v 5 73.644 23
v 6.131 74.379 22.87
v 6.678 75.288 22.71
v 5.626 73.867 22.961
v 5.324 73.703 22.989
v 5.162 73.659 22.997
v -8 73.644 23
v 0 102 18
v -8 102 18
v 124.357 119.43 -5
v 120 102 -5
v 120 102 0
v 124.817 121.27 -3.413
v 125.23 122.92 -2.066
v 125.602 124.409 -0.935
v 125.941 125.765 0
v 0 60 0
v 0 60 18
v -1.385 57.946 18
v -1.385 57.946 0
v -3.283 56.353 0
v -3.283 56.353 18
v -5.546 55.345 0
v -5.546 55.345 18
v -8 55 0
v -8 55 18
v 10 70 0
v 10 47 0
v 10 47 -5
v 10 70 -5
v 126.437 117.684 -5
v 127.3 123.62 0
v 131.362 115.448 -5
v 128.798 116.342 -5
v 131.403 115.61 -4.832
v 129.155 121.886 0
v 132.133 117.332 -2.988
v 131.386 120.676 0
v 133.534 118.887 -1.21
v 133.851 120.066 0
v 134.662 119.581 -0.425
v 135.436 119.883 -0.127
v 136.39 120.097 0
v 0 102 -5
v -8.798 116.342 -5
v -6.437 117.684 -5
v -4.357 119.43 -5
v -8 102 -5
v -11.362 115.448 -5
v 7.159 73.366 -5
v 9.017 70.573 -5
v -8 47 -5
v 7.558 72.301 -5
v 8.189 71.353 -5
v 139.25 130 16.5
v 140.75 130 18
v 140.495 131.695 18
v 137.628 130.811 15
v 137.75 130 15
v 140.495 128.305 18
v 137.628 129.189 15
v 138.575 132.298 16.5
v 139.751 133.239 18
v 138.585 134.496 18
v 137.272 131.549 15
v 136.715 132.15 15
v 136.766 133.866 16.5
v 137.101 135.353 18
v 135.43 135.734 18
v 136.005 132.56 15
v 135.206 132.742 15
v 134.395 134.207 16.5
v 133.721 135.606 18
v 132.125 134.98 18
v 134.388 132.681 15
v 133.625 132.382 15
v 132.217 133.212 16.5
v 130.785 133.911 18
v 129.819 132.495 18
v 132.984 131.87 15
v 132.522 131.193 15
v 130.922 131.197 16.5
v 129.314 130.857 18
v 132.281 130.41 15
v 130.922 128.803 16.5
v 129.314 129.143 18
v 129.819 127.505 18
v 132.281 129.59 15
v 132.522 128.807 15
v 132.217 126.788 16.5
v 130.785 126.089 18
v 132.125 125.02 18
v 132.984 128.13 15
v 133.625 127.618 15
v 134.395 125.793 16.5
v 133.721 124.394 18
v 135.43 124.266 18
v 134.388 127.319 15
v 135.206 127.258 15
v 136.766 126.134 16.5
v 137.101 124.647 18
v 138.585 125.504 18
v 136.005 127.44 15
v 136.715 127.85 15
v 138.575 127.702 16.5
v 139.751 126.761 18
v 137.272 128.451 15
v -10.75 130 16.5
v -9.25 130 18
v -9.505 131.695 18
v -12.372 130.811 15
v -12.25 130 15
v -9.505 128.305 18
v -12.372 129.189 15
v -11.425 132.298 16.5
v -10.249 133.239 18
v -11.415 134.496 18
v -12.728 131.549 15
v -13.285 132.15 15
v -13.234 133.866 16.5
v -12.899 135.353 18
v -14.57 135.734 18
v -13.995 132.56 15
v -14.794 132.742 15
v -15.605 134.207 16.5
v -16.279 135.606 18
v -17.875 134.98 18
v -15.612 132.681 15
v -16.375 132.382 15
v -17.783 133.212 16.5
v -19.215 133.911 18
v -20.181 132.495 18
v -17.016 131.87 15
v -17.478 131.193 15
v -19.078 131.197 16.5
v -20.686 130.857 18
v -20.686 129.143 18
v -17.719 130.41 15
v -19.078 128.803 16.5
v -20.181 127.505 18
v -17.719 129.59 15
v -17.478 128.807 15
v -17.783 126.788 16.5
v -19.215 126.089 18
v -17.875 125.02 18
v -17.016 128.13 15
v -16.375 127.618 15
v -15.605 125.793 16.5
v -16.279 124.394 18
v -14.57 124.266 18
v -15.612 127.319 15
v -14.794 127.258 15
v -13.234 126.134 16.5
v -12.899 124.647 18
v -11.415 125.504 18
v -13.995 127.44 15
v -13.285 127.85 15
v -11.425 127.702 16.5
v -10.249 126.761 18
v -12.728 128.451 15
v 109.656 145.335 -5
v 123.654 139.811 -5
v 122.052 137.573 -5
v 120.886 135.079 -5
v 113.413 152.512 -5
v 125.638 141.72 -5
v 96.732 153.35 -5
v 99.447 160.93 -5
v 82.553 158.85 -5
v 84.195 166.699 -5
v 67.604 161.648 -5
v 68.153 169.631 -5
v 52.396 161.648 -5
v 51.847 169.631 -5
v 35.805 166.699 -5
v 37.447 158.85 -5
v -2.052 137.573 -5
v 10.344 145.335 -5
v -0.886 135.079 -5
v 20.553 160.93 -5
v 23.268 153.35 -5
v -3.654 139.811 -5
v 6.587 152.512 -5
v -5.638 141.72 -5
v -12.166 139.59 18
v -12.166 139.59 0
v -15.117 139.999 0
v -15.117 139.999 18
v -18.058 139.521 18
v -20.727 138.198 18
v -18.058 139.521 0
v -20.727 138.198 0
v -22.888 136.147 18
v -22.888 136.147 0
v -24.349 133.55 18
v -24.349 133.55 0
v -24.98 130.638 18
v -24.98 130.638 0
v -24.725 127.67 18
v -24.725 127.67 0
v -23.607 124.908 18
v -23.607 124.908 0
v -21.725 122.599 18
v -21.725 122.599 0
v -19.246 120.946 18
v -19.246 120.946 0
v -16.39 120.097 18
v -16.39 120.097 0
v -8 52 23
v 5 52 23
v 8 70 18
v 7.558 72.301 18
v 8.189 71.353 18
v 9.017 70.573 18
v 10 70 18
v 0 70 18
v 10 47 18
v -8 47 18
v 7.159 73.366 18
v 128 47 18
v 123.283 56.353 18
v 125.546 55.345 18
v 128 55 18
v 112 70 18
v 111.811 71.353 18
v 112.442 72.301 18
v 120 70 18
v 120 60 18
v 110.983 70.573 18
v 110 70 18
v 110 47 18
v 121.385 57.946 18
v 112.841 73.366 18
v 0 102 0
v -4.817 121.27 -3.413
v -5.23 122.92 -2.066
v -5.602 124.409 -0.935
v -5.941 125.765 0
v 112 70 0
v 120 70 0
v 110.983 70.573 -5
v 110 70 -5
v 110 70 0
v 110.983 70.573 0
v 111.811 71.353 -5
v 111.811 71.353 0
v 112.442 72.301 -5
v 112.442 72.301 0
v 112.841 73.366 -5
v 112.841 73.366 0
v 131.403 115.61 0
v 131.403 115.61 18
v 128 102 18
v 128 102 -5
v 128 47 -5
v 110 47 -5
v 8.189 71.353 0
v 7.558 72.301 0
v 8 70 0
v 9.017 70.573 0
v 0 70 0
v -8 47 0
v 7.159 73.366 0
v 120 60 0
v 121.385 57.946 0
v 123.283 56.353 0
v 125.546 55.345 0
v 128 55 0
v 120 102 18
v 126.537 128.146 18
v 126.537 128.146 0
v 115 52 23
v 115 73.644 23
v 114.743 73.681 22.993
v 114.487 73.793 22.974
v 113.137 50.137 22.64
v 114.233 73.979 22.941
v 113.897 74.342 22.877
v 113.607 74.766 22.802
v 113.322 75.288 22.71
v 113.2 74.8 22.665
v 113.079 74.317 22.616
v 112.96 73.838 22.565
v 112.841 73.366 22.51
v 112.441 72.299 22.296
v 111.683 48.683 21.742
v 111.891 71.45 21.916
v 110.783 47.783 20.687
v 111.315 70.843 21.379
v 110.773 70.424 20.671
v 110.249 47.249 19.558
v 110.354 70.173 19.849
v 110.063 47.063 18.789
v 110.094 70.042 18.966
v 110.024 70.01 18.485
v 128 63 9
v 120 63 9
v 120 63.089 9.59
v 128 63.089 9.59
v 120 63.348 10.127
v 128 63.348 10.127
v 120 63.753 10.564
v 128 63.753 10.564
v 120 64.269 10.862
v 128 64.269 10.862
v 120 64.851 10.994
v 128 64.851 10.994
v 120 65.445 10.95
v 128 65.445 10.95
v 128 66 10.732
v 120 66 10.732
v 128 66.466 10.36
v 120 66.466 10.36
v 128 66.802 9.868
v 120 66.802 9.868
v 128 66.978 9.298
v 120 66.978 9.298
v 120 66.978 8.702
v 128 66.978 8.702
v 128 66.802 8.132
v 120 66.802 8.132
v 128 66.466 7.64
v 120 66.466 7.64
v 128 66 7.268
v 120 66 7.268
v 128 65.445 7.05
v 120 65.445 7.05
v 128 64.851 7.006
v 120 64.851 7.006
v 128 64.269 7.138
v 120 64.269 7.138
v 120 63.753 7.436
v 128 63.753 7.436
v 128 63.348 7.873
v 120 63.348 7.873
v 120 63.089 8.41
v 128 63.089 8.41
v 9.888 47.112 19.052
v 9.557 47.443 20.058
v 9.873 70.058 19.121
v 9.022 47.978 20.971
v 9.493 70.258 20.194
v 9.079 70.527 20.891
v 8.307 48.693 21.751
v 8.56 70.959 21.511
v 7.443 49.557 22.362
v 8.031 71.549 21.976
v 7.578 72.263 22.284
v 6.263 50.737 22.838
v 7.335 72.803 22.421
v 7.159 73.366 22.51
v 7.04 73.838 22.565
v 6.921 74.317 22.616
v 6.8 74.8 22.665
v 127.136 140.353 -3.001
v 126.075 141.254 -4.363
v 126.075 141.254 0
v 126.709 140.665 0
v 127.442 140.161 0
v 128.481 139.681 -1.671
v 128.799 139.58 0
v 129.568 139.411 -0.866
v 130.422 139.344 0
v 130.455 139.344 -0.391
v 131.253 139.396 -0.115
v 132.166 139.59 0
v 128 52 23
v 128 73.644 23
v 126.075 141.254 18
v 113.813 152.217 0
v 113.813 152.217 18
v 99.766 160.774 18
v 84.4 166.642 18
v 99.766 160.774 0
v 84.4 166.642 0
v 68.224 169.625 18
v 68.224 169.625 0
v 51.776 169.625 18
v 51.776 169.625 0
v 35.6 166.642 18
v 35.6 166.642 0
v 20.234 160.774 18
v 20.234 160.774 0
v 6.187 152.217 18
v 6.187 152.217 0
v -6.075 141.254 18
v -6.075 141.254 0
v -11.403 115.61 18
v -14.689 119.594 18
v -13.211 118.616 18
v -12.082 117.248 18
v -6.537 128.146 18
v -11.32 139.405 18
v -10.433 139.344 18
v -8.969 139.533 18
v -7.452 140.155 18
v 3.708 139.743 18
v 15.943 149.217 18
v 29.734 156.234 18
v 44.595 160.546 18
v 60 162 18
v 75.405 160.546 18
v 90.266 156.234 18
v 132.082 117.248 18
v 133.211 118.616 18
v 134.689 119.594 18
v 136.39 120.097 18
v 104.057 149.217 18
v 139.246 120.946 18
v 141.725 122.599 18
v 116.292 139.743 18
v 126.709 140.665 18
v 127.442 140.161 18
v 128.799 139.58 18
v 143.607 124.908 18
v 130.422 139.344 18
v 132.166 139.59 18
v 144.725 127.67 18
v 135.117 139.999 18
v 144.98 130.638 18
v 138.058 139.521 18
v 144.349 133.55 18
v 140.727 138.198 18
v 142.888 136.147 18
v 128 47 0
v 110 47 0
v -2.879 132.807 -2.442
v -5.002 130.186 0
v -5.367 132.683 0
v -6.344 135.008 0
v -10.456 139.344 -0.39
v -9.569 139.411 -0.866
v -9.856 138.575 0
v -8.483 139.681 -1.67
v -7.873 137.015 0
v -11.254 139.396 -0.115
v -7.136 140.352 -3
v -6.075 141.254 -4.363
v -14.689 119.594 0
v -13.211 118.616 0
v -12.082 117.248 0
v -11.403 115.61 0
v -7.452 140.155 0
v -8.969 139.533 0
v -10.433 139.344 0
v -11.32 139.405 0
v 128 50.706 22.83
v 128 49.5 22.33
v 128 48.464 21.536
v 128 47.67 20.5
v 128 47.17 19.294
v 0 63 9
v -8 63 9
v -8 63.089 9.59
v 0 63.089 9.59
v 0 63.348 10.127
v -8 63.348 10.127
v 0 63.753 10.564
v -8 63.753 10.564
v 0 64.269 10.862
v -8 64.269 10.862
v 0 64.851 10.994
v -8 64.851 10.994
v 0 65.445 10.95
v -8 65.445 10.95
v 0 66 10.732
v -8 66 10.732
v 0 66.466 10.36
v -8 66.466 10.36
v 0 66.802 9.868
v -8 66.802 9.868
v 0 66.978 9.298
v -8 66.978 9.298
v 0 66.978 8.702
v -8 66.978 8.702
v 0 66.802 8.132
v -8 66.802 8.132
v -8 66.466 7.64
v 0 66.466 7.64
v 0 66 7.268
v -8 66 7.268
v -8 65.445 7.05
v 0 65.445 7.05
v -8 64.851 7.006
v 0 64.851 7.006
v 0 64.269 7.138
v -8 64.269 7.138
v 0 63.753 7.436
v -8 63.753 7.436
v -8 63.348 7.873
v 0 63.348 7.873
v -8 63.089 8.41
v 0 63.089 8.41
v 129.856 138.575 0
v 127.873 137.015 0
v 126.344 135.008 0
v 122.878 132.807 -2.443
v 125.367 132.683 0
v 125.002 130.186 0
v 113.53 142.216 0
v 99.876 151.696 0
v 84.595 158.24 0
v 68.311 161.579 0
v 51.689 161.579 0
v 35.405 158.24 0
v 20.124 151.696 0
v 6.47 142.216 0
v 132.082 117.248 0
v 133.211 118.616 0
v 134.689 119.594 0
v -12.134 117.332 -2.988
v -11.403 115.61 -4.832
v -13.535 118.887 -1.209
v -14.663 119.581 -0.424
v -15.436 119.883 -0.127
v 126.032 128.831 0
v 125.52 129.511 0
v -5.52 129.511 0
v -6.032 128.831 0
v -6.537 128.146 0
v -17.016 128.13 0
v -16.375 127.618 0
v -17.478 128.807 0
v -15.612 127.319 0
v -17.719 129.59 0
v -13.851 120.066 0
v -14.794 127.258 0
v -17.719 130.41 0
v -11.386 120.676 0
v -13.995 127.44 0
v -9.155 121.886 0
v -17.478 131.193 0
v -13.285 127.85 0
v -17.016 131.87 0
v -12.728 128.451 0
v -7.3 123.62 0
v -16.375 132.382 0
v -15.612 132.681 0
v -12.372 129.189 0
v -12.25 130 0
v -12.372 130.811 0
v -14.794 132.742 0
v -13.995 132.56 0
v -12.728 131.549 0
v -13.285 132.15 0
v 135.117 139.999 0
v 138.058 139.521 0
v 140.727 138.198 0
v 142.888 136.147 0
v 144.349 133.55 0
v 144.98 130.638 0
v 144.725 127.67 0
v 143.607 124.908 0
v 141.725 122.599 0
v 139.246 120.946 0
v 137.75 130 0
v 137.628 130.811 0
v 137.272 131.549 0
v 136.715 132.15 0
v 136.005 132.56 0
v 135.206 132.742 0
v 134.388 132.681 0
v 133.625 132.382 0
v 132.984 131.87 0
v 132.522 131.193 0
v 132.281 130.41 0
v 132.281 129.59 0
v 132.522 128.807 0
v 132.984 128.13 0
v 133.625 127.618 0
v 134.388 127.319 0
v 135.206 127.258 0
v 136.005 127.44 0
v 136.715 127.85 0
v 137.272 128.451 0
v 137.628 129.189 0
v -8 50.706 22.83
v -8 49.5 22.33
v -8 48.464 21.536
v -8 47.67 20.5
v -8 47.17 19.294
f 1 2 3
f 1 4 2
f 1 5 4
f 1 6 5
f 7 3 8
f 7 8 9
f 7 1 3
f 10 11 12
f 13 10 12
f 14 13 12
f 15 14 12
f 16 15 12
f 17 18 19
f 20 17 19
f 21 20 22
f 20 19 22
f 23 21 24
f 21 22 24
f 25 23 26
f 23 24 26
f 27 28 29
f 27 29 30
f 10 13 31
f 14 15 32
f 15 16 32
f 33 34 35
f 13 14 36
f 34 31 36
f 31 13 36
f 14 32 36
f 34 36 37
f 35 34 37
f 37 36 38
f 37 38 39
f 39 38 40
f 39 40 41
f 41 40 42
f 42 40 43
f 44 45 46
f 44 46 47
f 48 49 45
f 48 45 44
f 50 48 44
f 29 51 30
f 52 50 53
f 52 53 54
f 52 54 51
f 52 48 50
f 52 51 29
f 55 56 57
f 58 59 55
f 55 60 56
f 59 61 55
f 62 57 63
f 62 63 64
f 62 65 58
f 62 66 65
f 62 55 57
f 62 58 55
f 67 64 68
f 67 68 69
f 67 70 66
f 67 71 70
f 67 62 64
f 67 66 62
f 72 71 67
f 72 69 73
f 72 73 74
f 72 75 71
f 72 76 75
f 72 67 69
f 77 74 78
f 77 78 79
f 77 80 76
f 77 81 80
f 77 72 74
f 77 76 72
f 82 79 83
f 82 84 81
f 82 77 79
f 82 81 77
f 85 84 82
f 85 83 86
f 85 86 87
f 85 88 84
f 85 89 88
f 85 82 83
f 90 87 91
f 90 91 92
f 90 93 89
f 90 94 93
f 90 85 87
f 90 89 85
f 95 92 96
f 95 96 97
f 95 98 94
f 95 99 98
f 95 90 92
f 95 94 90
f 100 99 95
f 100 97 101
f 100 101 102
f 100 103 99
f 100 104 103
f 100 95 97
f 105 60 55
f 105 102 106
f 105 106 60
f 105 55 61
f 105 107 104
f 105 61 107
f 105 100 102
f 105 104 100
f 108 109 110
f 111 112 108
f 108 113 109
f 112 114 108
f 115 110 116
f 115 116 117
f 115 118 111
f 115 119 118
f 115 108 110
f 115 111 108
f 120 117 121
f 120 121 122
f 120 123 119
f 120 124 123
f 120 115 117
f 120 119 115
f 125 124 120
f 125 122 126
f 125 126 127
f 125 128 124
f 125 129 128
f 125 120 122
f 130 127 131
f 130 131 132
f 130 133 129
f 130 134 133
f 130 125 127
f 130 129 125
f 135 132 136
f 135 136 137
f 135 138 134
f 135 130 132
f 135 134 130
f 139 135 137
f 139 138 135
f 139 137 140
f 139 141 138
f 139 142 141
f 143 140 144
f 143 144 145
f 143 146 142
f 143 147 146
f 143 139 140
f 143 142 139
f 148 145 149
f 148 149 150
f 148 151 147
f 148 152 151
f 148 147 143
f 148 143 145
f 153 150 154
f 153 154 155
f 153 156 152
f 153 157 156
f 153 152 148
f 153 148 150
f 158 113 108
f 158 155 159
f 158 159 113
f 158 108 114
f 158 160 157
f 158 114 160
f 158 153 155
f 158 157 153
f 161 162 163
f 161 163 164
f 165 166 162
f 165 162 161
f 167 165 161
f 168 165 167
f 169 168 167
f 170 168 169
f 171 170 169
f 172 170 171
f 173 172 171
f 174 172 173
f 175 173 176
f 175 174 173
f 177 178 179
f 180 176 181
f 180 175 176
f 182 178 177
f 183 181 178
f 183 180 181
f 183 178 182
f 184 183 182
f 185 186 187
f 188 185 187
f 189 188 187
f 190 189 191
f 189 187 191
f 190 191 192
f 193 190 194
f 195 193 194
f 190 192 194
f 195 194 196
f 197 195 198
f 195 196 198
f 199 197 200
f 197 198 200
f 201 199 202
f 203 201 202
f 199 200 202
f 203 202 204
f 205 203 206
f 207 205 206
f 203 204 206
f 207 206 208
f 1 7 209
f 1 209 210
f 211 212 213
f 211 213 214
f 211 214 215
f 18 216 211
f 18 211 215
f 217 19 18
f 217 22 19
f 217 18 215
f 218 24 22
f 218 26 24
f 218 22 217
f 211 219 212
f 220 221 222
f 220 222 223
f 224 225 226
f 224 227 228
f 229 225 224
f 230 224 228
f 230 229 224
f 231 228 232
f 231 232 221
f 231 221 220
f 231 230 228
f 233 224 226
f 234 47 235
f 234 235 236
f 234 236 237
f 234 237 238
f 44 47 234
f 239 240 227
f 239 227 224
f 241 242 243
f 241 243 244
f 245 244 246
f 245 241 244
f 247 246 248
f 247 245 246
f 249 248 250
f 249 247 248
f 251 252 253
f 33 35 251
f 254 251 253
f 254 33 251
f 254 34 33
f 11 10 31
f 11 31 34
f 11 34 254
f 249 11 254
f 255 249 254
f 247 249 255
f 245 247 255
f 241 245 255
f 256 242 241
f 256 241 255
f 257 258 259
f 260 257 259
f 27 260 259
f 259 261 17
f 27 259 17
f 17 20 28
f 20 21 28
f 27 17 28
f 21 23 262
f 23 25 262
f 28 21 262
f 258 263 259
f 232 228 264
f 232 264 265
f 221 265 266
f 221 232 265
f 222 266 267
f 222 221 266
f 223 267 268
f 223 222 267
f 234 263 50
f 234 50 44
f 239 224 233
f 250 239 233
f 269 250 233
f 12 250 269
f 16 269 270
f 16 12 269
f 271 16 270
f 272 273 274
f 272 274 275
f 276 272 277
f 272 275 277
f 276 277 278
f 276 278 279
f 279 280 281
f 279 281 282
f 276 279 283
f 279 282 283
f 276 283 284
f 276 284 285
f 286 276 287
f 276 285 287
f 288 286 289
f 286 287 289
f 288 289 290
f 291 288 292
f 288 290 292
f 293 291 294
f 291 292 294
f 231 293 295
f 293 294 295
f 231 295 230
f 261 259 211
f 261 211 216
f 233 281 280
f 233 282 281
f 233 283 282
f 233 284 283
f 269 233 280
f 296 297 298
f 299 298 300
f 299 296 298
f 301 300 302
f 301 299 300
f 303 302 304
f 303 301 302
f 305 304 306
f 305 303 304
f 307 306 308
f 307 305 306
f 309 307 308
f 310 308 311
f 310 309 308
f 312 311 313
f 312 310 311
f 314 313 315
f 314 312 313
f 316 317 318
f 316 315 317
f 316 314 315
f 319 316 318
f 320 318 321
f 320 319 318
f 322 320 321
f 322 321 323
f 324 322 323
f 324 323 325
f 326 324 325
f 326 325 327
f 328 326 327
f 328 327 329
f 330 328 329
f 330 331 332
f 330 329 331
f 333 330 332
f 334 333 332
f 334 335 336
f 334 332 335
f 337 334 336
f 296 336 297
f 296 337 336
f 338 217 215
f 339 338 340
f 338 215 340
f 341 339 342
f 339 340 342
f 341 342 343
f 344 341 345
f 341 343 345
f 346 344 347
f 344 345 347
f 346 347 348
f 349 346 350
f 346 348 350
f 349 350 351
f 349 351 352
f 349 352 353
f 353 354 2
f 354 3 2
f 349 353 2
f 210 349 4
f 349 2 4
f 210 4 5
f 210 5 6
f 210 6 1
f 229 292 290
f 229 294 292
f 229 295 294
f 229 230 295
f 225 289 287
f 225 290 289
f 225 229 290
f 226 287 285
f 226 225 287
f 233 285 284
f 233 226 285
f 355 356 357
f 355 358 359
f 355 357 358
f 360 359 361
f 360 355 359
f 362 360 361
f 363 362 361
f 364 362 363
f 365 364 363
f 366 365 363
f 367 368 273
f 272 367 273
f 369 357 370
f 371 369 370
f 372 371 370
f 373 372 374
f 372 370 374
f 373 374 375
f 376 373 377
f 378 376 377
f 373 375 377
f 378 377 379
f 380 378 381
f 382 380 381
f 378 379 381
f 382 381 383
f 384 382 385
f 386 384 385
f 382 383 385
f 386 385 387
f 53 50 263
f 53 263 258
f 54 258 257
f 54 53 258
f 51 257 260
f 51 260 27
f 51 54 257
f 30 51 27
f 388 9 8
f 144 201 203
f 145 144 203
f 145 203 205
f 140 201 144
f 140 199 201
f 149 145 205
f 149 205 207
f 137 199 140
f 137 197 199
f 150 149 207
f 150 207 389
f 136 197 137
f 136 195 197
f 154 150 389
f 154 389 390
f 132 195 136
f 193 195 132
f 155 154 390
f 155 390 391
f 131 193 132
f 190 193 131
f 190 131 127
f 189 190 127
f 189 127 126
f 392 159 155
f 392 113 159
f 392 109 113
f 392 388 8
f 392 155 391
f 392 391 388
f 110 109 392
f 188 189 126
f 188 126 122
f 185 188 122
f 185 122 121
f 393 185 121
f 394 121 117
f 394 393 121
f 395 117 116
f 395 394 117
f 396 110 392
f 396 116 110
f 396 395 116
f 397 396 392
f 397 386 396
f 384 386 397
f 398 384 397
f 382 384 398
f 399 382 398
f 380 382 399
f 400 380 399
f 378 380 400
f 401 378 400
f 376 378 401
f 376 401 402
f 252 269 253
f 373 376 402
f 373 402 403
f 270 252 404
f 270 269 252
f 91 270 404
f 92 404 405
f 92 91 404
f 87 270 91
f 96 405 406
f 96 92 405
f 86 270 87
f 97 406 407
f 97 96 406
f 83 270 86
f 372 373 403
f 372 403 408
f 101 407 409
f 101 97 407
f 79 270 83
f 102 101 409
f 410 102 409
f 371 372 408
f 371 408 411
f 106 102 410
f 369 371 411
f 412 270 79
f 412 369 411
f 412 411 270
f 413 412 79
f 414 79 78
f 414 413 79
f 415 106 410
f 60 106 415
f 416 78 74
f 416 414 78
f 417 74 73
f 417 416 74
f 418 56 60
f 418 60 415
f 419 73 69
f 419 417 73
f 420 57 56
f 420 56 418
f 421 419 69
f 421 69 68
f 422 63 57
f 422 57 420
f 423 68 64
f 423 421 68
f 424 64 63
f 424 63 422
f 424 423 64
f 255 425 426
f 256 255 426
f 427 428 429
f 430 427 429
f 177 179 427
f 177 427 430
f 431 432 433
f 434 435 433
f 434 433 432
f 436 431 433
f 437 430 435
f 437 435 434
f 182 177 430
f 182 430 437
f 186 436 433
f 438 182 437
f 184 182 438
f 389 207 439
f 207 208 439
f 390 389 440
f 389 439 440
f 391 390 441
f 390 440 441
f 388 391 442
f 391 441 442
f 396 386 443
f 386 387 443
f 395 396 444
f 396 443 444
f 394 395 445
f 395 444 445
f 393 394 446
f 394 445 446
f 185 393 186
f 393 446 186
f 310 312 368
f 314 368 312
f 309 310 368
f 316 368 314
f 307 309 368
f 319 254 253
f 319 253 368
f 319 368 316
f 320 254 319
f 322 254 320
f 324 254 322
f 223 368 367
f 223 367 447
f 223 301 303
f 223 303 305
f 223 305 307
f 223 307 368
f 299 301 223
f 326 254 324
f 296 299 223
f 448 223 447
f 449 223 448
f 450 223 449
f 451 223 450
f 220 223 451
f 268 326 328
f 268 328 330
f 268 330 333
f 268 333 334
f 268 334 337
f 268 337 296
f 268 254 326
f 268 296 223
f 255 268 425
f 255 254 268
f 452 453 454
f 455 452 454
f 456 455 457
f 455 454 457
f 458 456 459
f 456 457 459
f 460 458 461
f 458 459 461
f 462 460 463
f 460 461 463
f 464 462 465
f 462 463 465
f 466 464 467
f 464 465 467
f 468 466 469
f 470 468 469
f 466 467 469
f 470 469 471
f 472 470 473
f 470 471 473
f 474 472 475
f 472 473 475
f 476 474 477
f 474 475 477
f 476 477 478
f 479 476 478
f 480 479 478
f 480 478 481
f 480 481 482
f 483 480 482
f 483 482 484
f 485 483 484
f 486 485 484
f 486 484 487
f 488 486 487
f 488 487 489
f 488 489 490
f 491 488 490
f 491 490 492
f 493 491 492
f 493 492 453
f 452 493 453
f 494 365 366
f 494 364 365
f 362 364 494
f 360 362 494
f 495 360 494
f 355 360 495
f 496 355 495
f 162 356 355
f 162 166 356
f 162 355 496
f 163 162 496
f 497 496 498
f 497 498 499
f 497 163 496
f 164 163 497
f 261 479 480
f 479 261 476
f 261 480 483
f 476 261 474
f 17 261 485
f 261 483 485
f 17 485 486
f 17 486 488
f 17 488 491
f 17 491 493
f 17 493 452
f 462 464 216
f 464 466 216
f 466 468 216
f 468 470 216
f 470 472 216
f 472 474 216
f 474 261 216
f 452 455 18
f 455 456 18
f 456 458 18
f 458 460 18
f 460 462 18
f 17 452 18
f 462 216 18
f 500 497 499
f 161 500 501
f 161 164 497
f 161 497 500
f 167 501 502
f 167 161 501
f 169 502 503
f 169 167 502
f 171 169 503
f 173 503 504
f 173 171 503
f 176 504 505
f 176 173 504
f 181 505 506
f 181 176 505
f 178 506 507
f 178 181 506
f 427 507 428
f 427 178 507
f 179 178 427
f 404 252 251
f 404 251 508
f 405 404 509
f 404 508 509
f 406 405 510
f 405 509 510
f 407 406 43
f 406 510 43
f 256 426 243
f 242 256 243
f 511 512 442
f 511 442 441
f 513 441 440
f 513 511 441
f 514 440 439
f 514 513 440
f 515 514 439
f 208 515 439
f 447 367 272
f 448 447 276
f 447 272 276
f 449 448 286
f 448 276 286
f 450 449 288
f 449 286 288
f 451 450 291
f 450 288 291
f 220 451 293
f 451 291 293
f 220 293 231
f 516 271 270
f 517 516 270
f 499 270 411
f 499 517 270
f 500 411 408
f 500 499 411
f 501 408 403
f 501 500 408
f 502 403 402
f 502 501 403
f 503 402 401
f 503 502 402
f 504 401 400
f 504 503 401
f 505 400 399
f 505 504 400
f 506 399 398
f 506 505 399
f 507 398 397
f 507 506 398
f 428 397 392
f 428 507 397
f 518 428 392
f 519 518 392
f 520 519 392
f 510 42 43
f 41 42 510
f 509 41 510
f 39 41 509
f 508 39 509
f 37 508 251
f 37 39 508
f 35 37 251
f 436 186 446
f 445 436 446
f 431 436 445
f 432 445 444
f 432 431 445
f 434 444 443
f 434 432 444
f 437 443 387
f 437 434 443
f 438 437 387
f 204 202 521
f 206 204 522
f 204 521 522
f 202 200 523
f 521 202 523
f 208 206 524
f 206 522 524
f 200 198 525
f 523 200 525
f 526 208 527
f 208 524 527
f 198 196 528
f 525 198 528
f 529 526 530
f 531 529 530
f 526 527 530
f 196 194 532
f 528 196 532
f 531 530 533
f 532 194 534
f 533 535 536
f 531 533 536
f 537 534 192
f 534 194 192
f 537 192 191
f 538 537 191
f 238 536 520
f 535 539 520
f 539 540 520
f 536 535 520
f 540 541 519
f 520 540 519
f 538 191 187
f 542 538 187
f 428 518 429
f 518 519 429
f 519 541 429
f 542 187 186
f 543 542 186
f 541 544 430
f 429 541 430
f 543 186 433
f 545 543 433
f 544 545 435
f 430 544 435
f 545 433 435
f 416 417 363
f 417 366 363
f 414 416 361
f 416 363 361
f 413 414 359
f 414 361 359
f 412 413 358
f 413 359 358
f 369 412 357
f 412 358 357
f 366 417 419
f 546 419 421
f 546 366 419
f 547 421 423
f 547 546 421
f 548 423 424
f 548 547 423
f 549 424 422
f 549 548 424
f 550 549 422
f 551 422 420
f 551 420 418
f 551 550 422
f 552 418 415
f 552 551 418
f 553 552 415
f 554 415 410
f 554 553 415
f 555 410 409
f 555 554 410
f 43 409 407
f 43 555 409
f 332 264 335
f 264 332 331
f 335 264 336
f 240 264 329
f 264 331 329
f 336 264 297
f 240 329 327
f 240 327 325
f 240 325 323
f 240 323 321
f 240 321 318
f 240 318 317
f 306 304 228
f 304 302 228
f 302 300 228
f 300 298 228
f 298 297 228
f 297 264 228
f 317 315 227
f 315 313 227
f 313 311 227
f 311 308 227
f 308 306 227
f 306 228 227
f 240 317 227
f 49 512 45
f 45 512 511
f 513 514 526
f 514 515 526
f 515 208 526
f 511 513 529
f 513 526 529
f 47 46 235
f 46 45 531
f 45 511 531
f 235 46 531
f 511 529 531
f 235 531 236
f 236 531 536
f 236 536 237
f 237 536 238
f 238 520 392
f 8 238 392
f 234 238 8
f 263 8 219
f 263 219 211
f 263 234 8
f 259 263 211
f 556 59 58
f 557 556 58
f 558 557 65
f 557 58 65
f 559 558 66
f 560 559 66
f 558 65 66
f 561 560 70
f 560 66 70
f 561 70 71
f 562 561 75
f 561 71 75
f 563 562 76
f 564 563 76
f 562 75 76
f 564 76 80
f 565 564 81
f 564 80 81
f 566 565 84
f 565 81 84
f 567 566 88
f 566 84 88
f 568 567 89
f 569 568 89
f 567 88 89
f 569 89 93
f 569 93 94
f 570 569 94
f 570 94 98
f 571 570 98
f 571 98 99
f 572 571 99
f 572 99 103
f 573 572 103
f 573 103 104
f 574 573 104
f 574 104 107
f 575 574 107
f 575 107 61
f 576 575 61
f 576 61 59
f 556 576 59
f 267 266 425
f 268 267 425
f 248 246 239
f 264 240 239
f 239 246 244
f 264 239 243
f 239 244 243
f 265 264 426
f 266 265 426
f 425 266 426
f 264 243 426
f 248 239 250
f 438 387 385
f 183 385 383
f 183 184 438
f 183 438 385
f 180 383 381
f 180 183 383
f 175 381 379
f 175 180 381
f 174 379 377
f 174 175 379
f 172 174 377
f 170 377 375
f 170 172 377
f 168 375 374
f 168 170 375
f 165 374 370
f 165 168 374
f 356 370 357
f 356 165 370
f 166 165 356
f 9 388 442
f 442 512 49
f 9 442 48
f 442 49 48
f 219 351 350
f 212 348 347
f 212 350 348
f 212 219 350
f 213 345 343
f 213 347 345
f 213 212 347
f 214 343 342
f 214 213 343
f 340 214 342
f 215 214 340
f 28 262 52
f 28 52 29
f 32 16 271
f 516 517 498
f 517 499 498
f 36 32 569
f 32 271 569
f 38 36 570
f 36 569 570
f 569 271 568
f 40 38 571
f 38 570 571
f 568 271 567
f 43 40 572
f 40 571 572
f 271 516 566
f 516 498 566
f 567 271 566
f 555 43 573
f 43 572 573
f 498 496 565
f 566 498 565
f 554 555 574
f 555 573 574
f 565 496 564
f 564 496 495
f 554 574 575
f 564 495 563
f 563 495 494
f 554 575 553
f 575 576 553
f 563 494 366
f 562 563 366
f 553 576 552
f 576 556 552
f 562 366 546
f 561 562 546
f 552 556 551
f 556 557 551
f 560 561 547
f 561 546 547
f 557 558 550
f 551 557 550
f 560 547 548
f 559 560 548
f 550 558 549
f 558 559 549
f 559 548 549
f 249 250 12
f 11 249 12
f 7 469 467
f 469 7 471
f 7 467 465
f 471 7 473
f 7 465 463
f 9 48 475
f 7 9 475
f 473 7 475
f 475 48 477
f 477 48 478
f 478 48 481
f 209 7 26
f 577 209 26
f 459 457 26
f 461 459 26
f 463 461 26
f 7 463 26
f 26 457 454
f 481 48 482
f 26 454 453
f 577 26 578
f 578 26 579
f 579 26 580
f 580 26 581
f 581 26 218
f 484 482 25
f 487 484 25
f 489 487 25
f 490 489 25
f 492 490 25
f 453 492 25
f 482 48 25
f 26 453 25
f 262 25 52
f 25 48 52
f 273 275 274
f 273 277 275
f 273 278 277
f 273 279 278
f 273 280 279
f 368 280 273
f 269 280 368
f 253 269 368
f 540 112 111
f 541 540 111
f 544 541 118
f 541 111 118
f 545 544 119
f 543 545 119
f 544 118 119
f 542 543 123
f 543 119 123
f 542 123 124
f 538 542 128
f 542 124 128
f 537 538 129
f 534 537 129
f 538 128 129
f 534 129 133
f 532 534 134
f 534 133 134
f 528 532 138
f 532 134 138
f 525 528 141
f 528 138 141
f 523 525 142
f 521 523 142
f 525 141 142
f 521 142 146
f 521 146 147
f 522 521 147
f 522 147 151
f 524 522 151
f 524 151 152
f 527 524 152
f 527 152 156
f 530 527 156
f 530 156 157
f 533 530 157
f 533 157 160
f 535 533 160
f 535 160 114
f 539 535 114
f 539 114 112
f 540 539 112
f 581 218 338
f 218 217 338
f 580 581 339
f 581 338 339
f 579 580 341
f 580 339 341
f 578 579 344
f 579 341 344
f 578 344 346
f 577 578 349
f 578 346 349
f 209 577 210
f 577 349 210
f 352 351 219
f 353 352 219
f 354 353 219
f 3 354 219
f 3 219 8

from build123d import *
from OCP.BRepFilletAPI import BRepFilletAPI_MakeChamfer

# Parameters (mm, degrees)
ESQUISSE1_W             = 100
ESQUISSE1_H             = 10
BOSS_EXTRU_1_DEPTH      = 8
ESQUISSE2_W             = 100
ESQUISSE2_H             = 47.5
BOSS_EXTRU_2_DEPTH      = 10
BOSS_EXTRU_3_START      = -18
ESQUISSE3_R             = 2.75
BOSS_EXTRU_3_DEPTH      = 18
CONG_1_R                = 6
ESQUISSE5_W             = 100
ESQUISSE5_H             = 47.5
ENL_V_MAT_EXTRU_2_DEPTH = 3
ESQUISSE6_R             = 2.75
ENL_V_MAT_EXTRU_3_DEPTH = 225.162887353
ESQUISSE7_W             = 60
ESQUISSE7_H             = 60
BOSS_EXTRU_4_DEPTH      = 5
CONG_2_R                = 10
CHANFREIN2_SIZE         = 3
ESQUISSE8_R             = 1.5
ENL_V_MAT_EXTRU_4_DEPTH = 224.81688959
BOSS_EXTRUDE1_DEPTH     = 18
BOSS_EXTRUDE2_DEPTH     = 5
SKETCH6_R               = 2
CUT_EXTRUDE3_DEPTH      = 15
CUT_EXTRUDE2_DEPTH      = 18
MIRROR4_COPY_1_DEPTH    = 5
BOSS_EXTRUDE3_START     = 5
BOSS_EXTRUDE3_DEPTH     = 5
CHAMFER1_SIZE           = 28.356409098
CHAMFER1_SIZE_2         = 5
CHAMFER2_SIZE           = 5
FILLET2_R               = 5
FILLET1_R               = 5


# Some blends are built 0.0001 mm under size
with BuildPart() as part:
    # Esquisse1 → Boss.-Extru.1 (new body)
    with BuildSketch(Plane.XY):
        with BuildLine():
            Line((0, 0), (120, 0))
            Line((120, 0), (120, 70))
            Line((120, 70), (135, 130))
            ThreePointArc((135, 130), (60, 170), (-15, 130))
            Line((-15, 130), (0, 70))
            Line((0, 70), (0, 0))
        make_face()
        with Locations((60, 55)):
            Rectangle(ESQUISSE1_W, ESQUISSE1_H, mode=Mode.SUBTRACT)
        with Locations((60, 29.5)):
            Rectangle(ESQUISSE1_W, ESQUISSE1_H, mode=Mode.SUBTRACT)
        with BuildLine():
            Line((8, 70), (-6.536529961, 128.146119843))
            ThreePointArc((-6.536529961, 128.146119843), (60, 162), (126.536529961, 128.146119843))
            Line((126.536529961, 128.146119843), (112, 70))
            Line((112, 70), (8, 70))
        make_face(mode=Mode.SUBTRACT)
    extrude(amount=BOSS_EXTRU_1_DEPTH)

    # Esquisse2 → Boss.-Extru.2 (add)
    with BuildSketch(Plane.XY.offset(8)):
        with BuildLine():
            Line((0, 70), (0, 0))
            Line((0, 0), (120, 0))
            Line((120, 0), (120, 70))
            Line((120, 70), (135, 130))
            ThreePointArc((135, 130), (60, 170), (-15, 130))
            Line((-15, 130), (0, 70))
        make_face()
        with Locations((60, 42.25)):
            Rectangle(ESQUISSE2_W, ESQUISSE2_H, mode=Mode.SUBTRACT)
        with BuildLine():
            Line((112, 70), (126.536529961, 128.146119843))
            ThreePointArc((126.536529961, 128.146119843), (60, 162), (-6.536529961, 128.146119843))
            Line((-6.536529961, 128.146119843), (8, 70))
            Line((8, 70), (112, 70))
        make_face(mode=Mode.SUBTRACT)
    extrude(amount=BOSS_EXTRU_2_DEPTH)

    # Esquisse3 → Boss.-Extru.3 (add)
    # profile 1 of 2: a face of its own
    with BuildSketch(Plane.XY.offset(18).offset(BOSS_EXTRU_3_START)):
        with BuildLine():
            Line((0, 47), (0, 54))
            Line((0, 54), (-13, 54))
            Line((-13, 54), (-13, -12))
            ThreePointArc((-13, -12), (-3, -22), (7, -12))
            Line((7, -12), (7, 0))
            Line((7, 0), (0, 0))
            Line((0, 0), (0, 7))
            Line((0, 7), (-6, 7))
            Line((-6, 7), (-6, 47))
            Line((-6, 47), (0, 47))
        make_face()
        with Locations((-3, -12)):
            Circle(ESQUISSE3_R, mode=Mode.SUBTRACT)
    # profile 2 of 2: a face of its own
    with BuildSketch(Plane.XY.offset(18).offset(BOSS_EXTRU_3_START)):
        with BuildLine():
            Line((-5.941176471, 125.764705882), (-6.536529961, 128.146119843))
            ThreePointArc((-6.536529961, 128.146119843), (-5.777042038, 129.172127886), (-5.001734316, 130.18623456))
            ThreePointArc((-5.001734316, 130.18623456), (-24.781648189, 132.078306694), (-5.941176471, 125.764705882))
        make_face()
    boss_extru_3 = extrude(amount=BOSS_EXTRU_3_DEPTH)

    # Symétrie1: Boss.-Extru.3 across plane
    add(boss_extru_3.mirror(Plane.ZY.offset(-60)))

    # Congé1
    cong_1_edges = [part.edges().sort_by_distance(p)[0] for p in [
        (7, 0, 9),
        (0, 54, 9),
        (-13, 54, 9),
        (-8.977845414, 137.983336029, 9),
        (-12.57464375, 120.298574999, 9),
        (133, 54, 9),
        (113, 0, 9),
        (120, 54, 9),
        (132.57464375, 120.298574999, 9),
        (128.977845414, 137.983336029, 9),
    ]]
    fillet(cong_1_edges, radius=CONG_1_R)

    # Esquisse5 → Enlèv. mat.-Extru.2 (cut)
    with BuildSketch(Plane.XY.offset(8)):
        with Locations((60, 42.25)):
            Rectangle(ESQUISSE5_W, ESQUISSE5_H)
    extrude(amount=-ENL_V_MAT_EXTRU_2_DEPTH, mode=Mode.SUBTRACT)

    # Esquisse6 → Enlèv. mat.-Extru.3 (cut, through all)
    with BuildSketch(Plane.XY.offset(18)):
        with Locations((-15, 130)):
            Circle(ESQUISSE6_R)
        with Locations((135, 130)):
            Circle(ESQUISSE6_R)
    extrude(amount=-ENL_V_MAT_EXTRU_3_DEPTH, mode=Mode.SUBTRACT)

    # Esquisse7 → Boss.-Extru.4 (add)
    with BuildSketch(Plane(origin=(0, 0, 0), x_dir=(-1, 0, 0), z_dir=(0, 0, -1))):
        with Locations((-60, -30)):
            Rectangle(ESQUISSE7_W, ESQUISSE7_H)
    extrude(amount=-BOSS_EXTRU_4_DEPTH)

    # Congé2
    cong_2_edges = [part.edges().sort_by_distance(p)[0] for p in [
        (60, 0, 5),
        (90, 0, 2.5),
        (30, 0, 2.5),
    ]]
    fillet(cong_2_edges, radius=CONG_2_R)

    # Chanfrein2
    chanfrein2_edges = [part.edges().sort_by_distance(p)[0] for p in [
        (-5.75, -12, 18),
        (125.75, -12, 18),
        (-17.75, 130, 18),
        (132.25, 130, 18),
    ]]
    chamfer(chanfrein2_edges, length=CHANFREIN2_SIZE)

    # Esquisse8 → Enlèv. mat.-Extru.4 (cut, through all)
    with BuildSketch(Plane.XY.offset(5)):
        with Locations((40, -43.333333333)):
            Circle(ESQUISSE8_R)
        with Locations((40, -26.666666667)):
            Circle(ESQUISSE8_R)
        with Locations((60, -26.666666667)):
            Circle(ESQUISSE8_R)
        with Locations((60, -43.333333333)):
            Circle(ESQUISSE8_R)
        with Locations((80, -26.666666667)):
            Circle(ESQUISSE8_R)
        with Locations((80, -43.333333333)):
            Circle(ESQUISSE8_R)
    extrude(amount=-ENL_V_MAT_EXTRU_4_DEPTH, mode=Mode.SUBTRACT)

    # Sketch2 → Boss-Extrude1 (add)
    with BuildSketch(Plane.XY.offset(18)):
        with BuildLine():
            Line((-8, 60), (-8, 102))
            Line((-8, 102), (0, 70))
            Line((0, 70), (0, 60))
            ThreePointArc((0, 60), (-3.283009434, 56.352815094), (-8, 55))
            Line((-8, 55), (-8, 60))
        make_face()
    boss_extrude1 = extrude(amount=-BOSS_EXTRUDE1_DEPTH)

    # Sketch3 → Boss-Extrude2 (add)
    with BuildSketch(Plane(origin=(0, 0, 0), x_dir=(-1, 0, 0), z_dir=(0, 0, -1))):
        Polygon((8, 102), (8, 47), (-10, 47), (-10, 70), (-8, 70), (0, 102), align=None)
    boss_extrude2 = extrude(amount=BOSS_EXTRUDE2_DEPTH)

    # Sketch6 → Cut-Extrude3 (cut)
    with BuildSketch(Plane.ZY.offset(8)):
        with Locations(Location((9, 65, 0), (0, 0, 270))):
            Circle(SKETCH6_R)
    cut_extrude3 = extrude(amount=-CUT_EXTRUDE3_DEPTH, mode=Mode.SUBTRACT)

    # Mirror1: Boss-Extrude1, Cut-Extrude3 across plane
    add(boss_extrude1.mirror(Plane.ZY.offset(-60)))
    add(cut_extrude3.mirror(Plane.ZY.offset(-60)), mode=Mode.SUBTRACT)

    # Mirror3: Boss-Extrude2 across plane
    add(boss_extrude2.mirror(Plane.ZY.offset(-60)))

    # Sketch4 → Cut-Extrude2 (cut)
    with BuildSketch(Plane.XY.offset(18)):
        with BuildLine():
            Line((120, 70), (0, 70))
            Line((0, 70), (0, 60))
            ThreePointArc((0, 60), (-1.757359313, 55.757359313), (-6, 54))
            Line((-6, 54), (-7, 54))
            ThreePointArc((-7, 54), (-11.242640687, 52.242640687), (-13, 48))
            Line((-13, 48), (-13, -60))
            Line((-13, -60), (133, -60))
            Line((133, -60), (133, 48))
            ThreePointArc((133, 48), (131.242640687, 52.242640687), (127, 54))
            Line((127, 54), (126, 54))
            ThreePointArc((126, 54), (121.757359313, 55.757359313), (120, 60))
            Line((120, 60), (120, 70))
        make_face()
    extrude(amount=-CUT_EXTRUDE2_DEPTH, mode=Mode.SUBTRACT)

    # Mirror4: Boss-Extrude2 across plane
    add(boss_extrude2.mirror(Plane.XY.offset(9)))

    # Mirror4 copy 1 sketch → Mirror4 copy 1 (add)
    with BuildSketch(Plane(origin=(120, 0, 18), x_dir=(1, 0, 0), z_dir=(0, 0, 1))):
        Polygon((8, 102), (8, 47), (-10, 47), (-10, 70), (-8, 70), (0, 102), align=None)
    extrude(amount=MIRROR4_COPY_1_DEPTH)

    # Sketch5 → Boss-Extrude3 (add)
    with BuildSketch(Plane(origin=(0, 0, 0), x_dir=(-1, 0, 0), z_dir=(0, 0, -1)).offset(BOSS_EXTRUDE3_START)):
        with BuildLine():
            Line((-131.402615329, 115.610461316), (-128, 102))
            Line((-128, 102), (-120, 102))
            Line((-120, 102), (-125.941176471, 125.764705882))
            ThreePointArc((-125.941176471, 125.764705882), (-130.2319164, 121.209927259), (-136.389668956, 120.097029729))
            ThreePointArc((-136.389668956, 120.097029729), (-133.210561548, 118.615803933), (-131.402615329, 115.610461316))
        make_face()
        with BuildLine():
            ThreePointArc((-126.075357318, 141.25368237), (-128.884007473, 139.55597192), (-132.165711776, 139.589932756))
            ThreePointArc((-132.165711776, 139.589932756), (-127.045379023, 136.060033425), (-125.001734316, 130.18623456))
            ThreePointArc((-125.001734316, 130.18623456), (-60, 162), (5.001734316, 130.18623456))
            ThreePointArc((5.001734316, 130.18623456), (7.045379023, 136.060033425), (12.165711776, 139.589932756))
            ThreePointArc((12.165711776, 139.589932756), (8.884007473, 139.55597192), (6.075357318, 141.25368237))
            ThreePointArc((6.075357318, 141.25368237), (-60, 170), (-126.075357318, 141.25368237))
        make_face()
        with BuildLine():
            ThreePointArc((16.389668956, 120.097029729), (10.2319164, 121.209927259), (5.941176471, 125.764705882))
            Line((5.941176471, 125.764705882), (0, 102))
            Line((0, 102), (8, 102))
            Line((8, 102), (11.402615329, 115.610461316))
            ThreePointArc((11.402615329, 115.610461316), (13.210561548, 118.615803933), (16.389668956, 120.097029729))
        make_face()
    extrude(amount=-BOSS_EXTRUDE3_DEPTH)

    # Chamfer1
    chamfer1_edges_1 = [part.edges().sort_by_distance(p)[0] for p in [
        (124, 102, 23),
    ]]
    chamfer1_side_1 = [part.faces().sort_by_distance(p)[0] for p in [
        (124, 101.9, 23),
    ]]
    chamfer1_edges_2 = [part.edges().sort_by_distance(p)[0] for p in [
        (-4, 102, 23),
    ]]
    chamfer1_side_2 = [part.faces().sort_by_distance(p)[0] for p in [
        (-4, 102, 22.9),
    ]]
    chamfer1 = BRepFilletAPI_MakeChamfer(part.part.solid().wrapped)
    for e in chamfer1_edges_1:
        chamfer1.Add(CHAMFER1_SIZE - 0.0001, CHAMFER1_SIZE_2 - 0.0001, e.wrapped, chamfer1_side_1[0].wrapped)
    for e in chamfer1_edges_2:
        chamfer1.Add(CHAMFER1_SIZE_2 - 0.0001, CHAMFER1_SIZE - 0.0001, e.wrapped, chamfer1_side_2[0].wrapped)
    add(Compound.cast(chamfer1.Shape()), mode=Mode.REPLACE)  # a hair under: the kernel refuses the full size

    # Chamfer2
    chamfer2_edges = [part.edges().sort_by_distance(p)[0] for p in [
        (130.2319164, 121.209927259, -5),
        (-7.045379023, 136.060033425, -5),
        (127.045379023, 136.060033425, -5),
        (-10.2319164, 121.209927259, -5),
    ]]
    chamfer(chamfer2_edges, length=CHAMFER2_SIZE - 0.0001)  # a hair under: the kernel refuses the full size

    # Fillet2
    # the kernel refuses this fillet: 5 mm, written as the material it adds along each edge
    with BuildSketch(Plane(origin=(8, 70, -5), x_dir=(-0.2425356250363325, 0.970142500145332, 0), z_dir=(0, 0, 1)), Plane(origin=(8, 70, 18), x_dir=(-0.2425356250363325, 0.970142500145332, 0), z_dir=(0, 0, 1))) as fillet2_piece_1:
        with BuildLine():
            CenterArc((3.46943809, -5), FILLET2_R, 90, 52.269872505)
            Line((-0.48507125, -1.940285), (0, 0))
            Line((0, 0), (3.46943809, 0))
        make_face()
    extrude(amount=5)
    with BuildSketch(Plane(origin=(112, 70, -5), x_dir=(0.2425356250363291, 0.9701425001453328, 0), z_dir=(0, 0, 1)), Plane(origin=(112, 70, 18), x_dir=(0.2425356250363291, 0.9701425001453328, 0), z_dir=(0, 0, 1))) as fillet2_piece_2:
        with BuildLine():
            CenterArc((3.46943809, 5), FILLET2_R, 217.730127495, 52.269872505)
            Line((-0.48507125, 1.940285), (0, 0))
            Line((0, 0), (3.46943809, 0))
        make_face()
    extrude(amount=5)

    # Fillet1
    fillet1_edges = [part.edges().sort_by_distance(p)[0] for p in [
        (110, 58.5, 23),
        (10, 58.5, 23),
        (1, 47, 23),
        (119, 47, 23),
    ]]
    fillet(fillet1_edges, radius=FILLET1_R - 0.0001)  # a hair under: the kernel refuses the full size


solid = part.part
